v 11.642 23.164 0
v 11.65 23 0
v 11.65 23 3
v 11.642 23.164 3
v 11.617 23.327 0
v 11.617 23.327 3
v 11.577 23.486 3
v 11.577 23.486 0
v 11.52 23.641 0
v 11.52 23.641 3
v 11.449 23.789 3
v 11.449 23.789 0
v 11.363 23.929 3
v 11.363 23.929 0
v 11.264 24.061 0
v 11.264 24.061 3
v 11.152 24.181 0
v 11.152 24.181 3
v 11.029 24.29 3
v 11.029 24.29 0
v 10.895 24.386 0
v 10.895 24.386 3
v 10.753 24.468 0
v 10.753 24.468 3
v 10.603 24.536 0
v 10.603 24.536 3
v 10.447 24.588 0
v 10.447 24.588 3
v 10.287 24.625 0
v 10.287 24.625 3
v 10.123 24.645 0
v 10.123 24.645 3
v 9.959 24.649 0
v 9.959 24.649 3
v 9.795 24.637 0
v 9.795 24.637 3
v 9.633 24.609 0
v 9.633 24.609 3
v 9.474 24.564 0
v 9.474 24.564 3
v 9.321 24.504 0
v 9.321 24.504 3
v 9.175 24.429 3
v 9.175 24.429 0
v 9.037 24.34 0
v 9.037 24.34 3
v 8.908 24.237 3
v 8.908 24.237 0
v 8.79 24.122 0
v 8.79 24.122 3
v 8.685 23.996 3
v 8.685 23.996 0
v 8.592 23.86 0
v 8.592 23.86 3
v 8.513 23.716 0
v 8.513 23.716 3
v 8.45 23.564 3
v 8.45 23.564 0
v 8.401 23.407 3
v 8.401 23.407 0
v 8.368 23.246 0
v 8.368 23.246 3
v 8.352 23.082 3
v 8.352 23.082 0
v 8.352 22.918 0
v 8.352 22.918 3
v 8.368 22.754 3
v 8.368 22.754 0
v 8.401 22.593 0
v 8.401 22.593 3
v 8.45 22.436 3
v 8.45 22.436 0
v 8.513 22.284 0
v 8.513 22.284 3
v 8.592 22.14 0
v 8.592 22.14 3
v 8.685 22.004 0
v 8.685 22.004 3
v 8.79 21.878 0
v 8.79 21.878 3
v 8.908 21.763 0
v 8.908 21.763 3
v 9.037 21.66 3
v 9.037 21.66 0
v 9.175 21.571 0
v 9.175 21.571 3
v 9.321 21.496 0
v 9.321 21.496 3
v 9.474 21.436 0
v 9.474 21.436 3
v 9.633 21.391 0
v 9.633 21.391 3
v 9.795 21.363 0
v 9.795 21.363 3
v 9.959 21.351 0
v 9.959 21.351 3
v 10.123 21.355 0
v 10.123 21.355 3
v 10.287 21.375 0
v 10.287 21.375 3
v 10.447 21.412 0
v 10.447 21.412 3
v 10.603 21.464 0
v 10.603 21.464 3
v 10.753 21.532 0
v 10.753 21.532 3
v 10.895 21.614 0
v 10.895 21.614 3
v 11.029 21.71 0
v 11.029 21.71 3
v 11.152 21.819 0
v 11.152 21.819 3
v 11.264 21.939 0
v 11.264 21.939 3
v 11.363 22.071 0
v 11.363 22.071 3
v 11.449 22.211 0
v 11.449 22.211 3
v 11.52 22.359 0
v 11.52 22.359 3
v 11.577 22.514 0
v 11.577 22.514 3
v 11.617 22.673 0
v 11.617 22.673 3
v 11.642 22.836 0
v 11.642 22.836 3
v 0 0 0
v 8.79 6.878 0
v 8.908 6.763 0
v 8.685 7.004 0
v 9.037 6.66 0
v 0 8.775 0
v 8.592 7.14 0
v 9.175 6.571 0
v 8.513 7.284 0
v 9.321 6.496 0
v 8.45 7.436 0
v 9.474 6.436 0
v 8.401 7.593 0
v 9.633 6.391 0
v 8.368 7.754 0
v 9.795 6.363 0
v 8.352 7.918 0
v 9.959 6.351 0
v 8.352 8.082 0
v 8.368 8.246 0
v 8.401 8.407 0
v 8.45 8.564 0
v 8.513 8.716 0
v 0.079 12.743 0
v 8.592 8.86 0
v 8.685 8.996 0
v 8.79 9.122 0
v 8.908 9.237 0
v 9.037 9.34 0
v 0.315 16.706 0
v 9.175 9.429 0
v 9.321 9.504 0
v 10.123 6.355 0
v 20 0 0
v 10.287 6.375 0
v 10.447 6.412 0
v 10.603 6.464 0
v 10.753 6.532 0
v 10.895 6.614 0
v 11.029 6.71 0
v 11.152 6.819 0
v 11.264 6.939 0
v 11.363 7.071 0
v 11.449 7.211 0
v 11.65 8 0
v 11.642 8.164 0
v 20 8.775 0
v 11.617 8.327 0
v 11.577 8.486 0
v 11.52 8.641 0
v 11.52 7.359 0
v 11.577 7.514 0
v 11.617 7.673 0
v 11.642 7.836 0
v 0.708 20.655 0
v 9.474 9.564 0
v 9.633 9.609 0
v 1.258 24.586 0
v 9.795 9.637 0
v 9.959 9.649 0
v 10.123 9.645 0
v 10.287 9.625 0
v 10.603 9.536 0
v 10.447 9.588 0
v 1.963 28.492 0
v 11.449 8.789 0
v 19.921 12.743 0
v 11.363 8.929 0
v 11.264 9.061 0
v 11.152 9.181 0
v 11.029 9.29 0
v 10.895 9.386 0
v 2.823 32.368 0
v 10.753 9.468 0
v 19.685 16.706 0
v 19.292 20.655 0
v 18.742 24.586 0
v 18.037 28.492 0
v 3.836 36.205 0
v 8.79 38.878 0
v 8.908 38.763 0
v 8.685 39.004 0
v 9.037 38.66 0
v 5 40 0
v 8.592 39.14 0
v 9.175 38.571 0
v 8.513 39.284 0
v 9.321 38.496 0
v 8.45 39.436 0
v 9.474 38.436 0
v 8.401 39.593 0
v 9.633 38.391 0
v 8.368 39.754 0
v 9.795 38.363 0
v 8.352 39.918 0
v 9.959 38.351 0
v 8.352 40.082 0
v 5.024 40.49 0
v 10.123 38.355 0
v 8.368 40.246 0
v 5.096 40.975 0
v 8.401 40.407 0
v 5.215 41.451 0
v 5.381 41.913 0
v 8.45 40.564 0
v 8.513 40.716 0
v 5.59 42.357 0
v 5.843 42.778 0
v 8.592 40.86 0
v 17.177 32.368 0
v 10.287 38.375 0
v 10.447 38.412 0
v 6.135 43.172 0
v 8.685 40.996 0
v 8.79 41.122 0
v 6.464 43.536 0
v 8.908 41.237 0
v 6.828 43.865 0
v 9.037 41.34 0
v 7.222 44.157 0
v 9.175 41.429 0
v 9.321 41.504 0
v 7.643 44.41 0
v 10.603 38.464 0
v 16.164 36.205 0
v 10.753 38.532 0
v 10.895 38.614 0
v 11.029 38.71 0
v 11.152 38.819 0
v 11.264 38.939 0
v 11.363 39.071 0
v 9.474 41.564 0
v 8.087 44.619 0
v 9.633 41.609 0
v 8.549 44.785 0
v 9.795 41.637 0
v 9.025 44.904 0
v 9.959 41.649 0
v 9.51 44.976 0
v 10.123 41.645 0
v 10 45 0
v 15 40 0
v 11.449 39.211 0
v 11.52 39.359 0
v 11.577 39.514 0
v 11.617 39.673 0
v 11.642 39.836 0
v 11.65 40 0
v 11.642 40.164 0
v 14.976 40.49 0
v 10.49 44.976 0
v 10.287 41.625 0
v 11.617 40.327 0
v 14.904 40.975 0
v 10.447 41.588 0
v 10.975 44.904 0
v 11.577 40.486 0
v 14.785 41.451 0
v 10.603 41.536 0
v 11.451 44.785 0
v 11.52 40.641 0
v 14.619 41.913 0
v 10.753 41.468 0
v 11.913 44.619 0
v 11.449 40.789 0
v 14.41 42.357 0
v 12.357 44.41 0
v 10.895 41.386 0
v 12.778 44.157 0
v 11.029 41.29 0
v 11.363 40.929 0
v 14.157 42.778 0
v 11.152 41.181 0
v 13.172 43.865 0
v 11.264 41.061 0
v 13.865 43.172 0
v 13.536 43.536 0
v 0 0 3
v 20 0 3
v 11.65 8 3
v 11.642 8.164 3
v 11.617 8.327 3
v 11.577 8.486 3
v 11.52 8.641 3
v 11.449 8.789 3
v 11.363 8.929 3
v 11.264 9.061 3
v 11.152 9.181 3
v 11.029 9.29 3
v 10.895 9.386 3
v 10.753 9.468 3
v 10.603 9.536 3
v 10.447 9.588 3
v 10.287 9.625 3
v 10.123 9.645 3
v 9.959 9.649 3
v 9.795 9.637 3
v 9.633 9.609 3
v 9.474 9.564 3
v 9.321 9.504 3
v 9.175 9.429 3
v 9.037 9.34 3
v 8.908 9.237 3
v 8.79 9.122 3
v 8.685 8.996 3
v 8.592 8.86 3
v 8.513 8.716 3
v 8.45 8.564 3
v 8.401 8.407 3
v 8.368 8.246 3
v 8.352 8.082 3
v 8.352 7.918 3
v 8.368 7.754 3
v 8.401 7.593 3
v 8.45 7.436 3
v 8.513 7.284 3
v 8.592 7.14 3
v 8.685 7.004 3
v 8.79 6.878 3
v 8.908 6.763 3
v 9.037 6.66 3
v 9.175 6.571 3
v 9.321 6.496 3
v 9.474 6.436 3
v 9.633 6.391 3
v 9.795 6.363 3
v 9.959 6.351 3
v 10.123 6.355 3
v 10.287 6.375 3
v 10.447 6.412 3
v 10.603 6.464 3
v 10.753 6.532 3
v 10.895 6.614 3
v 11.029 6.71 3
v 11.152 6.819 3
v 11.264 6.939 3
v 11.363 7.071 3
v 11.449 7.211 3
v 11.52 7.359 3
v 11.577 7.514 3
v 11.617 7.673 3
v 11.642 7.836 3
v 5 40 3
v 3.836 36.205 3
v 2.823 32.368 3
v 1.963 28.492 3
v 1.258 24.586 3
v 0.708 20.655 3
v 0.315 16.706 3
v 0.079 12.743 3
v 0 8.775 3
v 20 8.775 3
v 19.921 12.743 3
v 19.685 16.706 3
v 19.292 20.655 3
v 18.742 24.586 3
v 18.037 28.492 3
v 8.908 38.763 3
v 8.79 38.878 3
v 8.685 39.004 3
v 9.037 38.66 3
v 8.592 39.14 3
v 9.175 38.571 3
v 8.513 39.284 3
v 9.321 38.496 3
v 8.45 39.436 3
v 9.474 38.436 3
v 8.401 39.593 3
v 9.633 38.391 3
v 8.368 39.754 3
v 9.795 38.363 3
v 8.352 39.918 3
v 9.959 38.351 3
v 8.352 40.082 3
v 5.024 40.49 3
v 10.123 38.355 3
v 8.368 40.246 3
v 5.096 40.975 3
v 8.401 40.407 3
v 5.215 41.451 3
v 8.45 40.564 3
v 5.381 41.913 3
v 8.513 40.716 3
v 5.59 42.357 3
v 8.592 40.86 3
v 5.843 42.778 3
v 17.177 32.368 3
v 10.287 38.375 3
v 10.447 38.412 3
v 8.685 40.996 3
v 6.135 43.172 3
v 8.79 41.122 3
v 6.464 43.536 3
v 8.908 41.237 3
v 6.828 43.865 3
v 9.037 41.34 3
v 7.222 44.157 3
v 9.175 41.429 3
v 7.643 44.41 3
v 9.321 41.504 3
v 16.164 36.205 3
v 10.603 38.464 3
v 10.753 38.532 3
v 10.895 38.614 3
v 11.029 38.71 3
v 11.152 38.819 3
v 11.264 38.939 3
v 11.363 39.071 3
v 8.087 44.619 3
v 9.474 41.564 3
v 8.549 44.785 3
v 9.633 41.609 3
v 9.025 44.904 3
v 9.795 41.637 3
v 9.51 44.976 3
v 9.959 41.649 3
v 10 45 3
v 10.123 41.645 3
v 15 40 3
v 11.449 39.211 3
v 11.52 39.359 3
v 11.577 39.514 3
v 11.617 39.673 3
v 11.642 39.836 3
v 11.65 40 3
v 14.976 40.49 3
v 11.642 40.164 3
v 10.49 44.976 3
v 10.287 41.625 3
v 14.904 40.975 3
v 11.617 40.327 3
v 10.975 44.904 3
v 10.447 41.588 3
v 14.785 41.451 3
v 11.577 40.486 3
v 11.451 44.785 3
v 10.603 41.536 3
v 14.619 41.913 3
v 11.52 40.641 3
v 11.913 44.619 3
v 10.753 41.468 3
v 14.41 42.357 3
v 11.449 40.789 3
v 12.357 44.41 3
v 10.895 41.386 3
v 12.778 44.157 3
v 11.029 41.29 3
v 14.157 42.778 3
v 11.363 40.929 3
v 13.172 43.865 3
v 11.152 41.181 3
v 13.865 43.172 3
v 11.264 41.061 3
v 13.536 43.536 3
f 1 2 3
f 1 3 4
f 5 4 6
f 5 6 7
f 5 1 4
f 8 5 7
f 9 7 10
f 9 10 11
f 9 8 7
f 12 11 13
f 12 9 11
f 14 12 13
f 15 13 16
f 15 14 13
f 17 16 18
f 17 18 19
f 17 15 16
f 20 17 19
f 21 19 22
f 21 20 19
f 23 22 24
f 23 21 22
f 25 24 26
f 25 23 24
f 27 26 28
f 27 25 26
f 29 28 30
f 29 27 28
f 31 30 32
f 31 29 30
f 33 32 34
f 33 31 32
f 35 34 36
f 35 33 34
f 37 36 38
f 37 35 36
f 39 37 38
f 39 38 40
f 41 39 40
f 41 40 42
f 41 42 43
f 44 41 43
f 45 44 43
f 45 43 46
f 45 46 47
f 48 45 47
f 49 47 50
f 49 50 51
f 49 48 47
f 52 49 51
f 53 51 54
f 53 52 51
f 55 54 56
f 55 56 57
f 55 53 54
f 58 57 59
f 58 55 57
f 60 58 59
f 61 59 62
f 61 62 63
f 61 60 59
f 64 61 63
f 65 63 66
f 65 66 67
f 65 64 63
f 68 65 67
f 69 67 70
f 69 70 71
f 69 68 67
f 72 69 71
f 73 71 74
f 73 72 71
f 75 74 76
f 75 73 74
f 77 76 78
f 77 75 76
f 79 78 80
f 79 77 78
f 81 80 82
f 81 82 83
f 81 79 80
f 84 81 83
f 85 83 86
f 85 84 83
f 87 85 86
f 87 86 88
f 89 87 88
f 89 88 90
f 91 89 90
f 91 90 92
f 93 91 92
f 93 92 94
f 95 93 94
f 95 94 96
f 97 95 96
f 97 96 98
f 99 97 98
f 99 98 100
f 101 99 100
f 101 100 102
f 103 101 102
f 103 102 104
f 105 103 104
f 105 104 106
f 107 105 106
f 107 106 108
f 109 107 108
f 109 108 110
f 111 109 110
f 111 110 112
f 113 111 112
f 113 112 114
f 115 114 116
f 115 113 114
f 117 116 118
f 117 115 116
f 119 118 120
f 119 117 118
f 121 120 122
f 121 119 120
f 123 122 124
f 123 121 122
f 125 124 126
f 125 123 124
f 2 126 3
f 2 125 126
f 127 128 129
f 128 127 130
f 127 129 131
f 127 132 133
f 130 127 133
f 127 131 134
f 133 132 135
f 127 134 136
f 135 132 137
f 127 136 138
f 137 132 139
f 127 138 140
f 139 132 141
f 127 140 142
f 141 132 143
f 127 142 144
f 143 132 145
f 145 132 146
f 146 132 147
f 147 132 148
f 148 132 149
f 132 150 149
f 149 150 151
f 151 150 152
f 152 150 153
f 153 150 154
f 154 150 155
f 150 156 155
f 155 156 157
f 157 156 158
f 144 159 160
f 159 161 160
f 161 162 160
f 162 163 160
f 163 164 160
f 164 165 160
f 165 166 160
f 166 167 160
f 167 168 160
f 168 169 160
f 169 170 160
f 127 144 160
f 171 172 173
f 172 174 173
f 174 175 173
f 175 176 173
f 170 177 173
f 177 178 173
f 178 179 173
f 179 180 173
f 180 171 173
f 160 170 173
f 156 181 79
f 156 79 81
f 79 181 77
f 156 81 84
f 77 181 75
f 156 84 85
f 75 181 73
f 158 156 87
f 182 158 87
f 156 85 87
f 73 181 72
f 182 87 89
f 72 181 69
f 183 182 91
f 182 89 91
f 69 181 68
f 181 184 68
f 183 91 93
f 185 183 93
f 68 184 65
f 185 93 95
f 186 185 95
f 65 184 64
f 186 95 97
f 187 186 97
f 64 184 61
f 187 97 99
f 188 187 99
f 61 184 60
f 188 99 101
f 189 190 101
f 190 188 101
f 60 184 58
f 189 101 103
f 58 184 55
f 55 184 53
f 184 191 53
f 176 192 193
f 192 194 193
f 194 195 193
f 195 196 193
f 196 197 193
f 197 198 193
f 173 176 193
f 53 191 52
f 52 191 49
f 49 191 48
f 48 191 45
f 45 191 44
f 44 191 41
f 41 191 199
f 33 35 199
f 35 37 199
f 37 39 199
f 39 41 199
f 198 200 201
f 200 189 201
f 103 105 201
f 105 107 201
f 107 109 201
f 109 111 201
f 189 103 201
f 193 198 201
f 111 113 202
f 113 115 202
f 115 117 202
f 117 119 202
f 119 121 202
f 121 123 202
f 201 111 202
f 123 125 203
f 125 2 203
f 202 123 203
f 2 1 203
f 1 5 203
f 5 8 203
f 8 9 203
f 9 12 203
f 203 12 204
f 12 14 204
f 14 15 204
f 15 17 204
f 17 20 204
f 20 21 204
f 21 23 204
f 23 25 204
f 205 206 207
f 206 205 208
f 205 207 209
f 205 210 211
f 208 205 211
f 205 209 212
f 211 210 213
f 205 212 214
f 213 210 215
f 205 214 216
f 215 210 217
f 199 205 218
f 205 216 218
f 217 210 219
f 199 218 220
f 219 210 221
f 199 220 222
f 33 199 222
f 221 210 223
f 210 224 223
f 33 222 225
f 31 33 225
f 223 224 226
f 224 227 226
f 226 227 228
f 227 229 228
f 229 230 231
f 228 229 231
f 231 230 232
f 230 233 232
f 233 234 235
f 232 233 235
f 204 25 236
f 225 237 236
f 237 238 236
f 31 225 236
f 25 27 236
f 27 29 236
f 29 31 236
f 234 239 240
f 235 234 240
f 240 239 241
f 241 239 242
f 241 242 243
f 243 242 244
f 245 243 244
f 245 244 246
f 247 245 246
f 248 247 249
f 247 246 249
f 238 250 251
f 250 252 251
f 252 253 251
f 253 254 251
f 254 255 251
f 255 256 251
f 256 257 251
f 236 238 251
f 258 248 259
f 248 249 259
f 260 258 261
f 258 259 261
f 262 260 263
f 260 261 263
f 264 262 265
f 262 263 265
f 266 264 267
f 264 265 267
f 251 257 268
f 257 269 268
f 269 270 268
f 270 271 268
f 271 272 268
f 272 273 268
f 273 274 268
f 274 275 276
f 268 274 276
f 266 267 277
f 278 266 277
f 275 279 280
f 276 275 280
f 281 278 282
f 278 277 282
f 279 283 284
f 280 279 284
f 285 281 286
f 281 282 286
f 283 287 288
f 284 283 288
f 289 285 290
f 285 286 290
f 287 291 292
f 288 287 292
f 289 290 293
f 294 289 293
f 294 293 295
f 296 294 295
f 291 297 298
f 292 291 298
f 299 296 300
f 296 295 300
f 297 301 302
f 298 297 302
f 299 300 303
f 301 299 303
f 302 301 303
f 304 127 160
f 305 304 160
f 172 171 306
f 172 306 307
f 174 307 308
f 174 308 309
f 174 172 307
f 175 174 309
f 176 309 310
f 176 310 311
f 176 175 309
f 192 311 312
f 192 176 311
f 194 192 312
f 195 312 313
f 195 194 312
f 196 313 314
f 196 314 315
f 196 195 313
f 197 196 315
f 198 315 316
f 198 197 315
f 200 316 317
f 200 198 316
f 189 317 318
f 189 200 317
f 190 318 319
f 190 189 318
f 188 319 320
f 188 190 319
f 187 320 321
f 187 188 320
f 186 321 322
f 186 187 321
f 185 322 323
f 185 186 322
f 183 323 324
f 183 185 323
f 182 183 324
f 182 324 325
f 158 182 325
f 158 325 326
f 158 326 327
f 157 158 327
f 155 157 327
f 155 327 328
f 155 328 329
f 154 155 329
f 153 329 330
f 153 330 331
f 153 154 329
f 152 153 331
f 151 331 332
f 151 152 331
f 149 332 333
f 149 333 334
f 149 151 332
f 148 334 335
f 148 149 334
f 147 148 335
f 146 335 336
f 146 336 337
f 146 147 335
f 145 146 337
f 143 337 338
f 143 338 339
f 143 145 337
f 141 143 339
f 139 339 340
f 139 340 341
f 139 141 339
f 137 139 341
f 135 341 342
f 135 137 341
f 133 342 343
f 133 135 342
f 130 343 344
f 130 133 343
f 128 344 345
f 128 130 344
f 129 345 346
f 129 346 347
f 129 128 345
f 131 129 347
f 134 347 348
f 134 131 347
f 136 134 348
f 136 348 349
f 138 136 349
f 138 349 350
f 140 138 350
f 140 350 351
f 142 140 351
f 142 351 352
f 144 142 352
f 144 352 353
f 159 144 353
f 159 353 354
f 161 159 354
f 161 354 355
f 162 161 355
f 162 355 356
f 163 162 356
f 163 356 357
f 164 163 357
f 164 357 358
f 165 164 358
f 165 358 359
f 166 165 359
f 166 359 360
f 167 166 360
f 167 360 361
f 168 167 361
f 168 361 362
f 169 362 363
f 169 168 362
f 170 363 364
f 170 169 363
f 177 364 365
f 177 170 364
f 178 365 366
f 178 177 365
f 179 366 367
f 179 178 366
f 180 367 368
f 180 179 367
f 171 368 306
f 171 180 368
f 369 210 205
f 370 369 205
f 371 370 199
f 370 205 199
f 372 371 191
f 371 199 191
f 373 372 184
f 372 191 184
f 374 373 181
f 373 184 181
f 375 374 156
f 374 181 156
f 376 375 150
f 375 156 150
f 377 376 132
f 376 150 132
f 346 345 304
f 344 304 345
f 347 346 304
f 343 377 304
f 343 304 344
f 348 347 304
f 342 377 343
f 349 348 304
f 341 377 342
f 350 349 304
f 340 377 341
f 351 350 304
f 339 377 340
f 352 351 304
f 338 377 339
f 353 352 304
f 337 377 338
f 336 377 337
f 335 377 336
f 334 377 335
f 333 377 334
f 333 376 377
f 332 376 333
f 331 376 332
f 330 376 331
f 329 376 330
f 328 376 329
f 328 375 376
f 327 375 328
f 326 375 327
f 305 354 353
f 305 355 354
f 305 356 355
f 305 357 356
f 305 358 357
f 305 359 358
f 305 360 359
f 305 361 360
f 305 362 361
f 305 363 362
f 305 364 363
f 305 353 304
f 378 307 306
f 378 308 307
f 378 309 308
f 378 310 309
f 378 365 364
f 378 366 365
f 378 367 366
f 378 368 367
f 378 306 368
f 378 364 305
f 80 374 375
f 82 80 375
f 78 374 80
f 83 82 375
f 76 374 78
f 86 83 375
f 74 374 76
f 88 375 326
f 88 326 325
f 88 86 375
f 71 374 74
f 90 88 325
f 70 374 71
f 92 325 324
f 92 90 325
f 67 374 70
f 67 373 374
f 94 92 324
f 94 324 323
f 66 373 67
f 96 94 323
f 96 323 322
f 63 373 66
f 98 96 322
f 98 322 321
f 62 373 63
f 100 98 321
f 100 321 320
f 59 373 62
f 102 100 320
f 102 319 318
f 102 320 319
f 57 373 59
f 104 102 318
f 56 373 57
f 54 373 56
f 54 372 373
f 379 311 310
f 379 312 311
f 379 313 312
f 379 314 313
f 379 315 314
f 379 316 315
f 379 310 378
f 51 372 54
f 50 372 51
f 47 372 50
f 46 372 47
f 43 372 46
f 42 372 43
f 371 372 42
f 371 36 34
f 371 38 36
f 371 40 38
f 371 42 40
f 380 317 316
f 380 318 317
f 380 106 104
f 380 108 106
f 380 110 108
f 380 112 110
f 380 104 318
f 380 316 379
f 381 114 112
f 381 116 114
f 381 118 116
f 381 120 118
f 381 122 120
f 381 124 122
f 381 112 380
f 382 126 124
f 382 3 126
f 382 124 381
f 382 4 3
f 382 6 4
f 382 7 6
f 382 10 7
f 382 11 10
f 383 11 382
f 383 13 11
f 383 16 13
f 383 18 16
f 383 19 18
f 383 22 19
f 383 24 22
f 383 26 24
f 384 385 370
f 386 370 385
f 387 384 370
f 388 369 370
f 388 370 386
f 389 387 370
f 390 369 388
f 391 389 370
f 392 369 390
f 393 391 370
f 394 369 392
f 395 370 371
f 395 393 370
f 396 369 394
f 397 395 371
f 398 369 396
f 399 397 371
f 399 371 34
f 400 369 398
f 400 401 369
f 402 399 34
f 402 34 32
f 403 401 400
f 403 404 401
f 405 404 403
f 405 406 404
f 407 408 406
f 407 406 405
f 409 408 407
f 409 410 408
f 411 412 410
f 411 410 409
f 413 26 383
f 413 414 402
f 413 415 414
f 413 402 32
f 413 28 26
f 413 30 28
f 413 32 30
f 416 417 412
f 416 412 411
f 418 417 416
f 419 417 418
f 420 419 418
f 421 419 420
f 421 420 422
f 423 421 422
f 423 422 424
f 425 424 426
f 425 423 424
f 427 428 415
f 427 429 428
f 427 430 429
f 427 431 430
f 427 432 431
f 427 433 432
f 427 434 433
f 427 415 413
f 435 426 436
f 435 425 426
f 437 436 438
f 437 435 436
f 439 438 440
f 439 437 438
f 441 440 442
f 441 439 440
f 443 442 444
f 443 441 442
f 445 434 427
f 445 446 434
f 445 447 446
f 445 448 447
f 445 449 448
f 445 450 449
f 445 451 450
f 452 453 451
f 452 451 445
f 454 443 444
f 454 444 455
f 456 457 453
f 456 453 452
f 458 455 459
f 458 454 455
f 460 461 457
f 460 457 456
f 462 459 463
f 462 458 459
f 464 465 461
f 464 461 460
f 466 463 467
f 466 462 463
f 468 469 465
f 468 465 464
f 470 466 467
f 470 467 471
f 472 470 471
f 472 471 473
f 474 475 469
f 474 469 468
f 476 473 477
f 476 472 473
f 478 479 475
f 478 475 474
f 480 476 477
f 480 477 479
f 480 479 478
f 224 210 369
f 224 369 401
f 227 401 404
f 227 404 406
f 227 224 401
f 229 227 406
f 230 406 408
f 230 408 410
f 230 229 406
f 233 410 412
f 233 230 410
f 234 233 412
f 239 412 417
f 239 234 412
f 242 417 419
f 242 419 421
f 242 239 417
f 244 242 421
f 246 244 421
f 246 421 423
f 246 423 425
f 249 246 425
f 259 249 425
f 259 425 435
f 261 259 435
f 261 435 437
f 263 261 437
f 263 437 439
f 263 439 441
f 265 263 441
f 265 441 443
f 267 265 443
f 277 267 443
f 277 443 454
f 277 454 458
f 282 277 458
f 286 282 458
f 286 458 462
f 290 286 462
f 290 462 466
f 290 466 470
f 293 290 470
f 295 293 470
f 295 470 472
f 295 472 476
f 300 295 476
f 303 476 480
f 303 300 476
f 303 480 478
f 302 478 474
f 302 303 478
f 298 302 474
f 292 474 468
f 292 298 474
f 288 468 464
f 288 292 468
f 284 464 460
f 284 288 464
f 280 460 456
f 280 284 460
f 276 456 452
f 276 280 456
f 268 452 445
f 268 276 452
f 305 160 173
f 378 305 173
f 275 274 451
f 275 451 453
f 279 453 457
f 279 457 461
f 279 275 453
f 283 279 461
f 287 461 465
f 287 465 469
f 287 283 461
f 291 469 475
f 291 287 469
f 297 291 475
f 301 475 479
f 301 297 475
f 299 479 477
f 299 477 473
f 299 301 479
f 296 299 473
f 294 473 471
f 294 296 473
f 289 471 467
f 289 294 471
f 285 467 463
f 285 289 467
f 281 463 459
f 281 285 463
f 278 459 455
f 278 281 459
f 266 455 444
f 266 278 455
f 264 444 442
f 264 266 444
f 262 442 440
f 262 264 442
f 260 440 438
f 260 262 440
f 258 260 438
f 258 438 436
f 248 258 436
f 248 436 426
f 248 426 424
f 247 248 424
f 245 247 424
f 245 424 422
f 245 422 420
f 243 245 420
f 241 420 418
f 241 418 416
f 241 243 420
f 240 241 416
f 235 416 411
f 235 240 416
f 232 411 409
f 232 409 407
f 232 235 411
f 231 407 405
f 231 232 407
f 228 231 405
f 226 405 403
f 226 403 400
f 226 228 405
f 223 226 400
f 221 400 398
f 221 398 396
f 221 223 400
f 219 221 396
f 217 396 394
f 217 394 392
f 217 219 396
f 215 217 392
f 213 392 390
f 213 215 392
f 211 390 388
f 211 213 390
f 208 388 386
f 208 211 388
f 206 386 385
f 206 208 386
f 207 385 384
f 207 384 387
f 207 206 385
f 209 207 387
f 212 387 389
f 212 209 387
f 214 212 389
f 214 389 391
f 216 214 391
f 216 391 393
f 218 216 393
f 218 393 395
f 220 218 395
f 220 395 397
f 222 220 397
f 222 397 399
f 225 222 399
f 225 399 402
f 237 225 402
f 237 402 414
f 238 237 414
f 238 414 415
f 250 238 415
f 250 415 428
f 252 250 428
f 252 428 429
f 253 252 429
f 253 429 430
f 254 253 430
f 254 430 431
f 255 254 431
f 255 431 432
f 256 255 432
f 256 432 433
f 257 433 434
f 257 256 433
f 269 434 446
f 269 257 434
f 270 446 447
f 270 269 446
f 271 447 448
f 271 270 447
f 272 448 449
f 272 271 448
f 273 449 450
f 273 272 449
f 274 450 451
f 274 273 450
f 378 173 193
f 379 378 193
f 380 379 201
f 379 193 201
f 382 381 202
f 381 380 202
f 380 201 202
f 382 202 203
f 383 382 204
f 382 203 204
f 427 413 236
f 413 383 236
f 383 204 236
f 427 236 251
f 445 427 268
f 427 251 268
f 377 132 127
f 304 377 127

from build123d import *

# Parameters (mm, degrees)
SKETCH_1_R          = 1.65
EXTRUDE_1_DEPTH     = 3
CUT_EXTRUDE_START   = -28
CUT_EXTRUDE_3_DEPTH = 28
FILLET_1_R          = 100


with BuildPart() as part:
    # 草图1 → 凸台-拉伸1 (new body)
    with BuildSketch(Plane.XY):
        with BuildLine():
            Line((0, 0), (20, 0))
            Line((20, 0), (20, 40))
            ThreePointArc((20, 40), (10, 50), (0, 40))
            Line((0, 40), (0, 0))
        make_face()
        with Locations((10, 40)):
            Circle(SKETCH_1_R, mode=Mode.SUBTRACT)
        with Locations((10, 8)):
            Circle(SKETCH_1_R, mode=Mode.SUBTRACT)
        with Locations((10, 23)):
            Circle(SKETCH_1_R, mode=Mode.SUBTRACT)
    extrude(amount=EXTRUDE_1_DEPTH)

    # 草图4 → 切除-拉伸3 (cut)
    with BuildSketch(Plane.XY.offset(3).offset(CUT_EXTRUDE_START)):
        with BuildLine():
            Line((0, 40), (5, 40))
            ThreePointArc((5, 40), (10, 45), (15, 40))
            Line((15, 40), (20, 40))
            ThreePointArc((20, 40), (10, 50), (0, 40))
        make_face()
    extrude(amount=CUT_EXTRUDE_3_DEPTH, mode=Mode.SUBTRACT)

    # 圆角1
    # the kernel refuses this fillet: 100 mm, written as the material it takes off along each edge
    with BuildSketch(Plane(origin=(20, 40, -78.06247498), x_dir=(0, -1, 0), z_dir=(0, 0, 1))) as fillet_1_piece_1:
        with BuildLine():
            CenterArc((31.224989992, -100), FILLET_1_R, 90, 18.194872339)
            Line((0, -5), (0, 0))
            Line((0, 0), (31.224989992, 0))
        make_face()
    extrude(amount=159.12494996, mode=Mode.SUBTRACT)
    with BuildSketch(Plane(origin=(0, 40, -78.06247498), x_dir=(0, -1, 0), z_dir=(0, 0, 1))) as fillet_1_piece_2:
        with BuildLine():
            CenterArc((31.224989992, 100), FILLET_1_R, 251.805127661, 18.194872339)
            Line((0, 5), (0, 0))
            Line((0, 0), (31.224989992, 0))
        make_face()
    extrude(amount=159.12494996, mode=Mode.SUBTRACT)


solid = part.part
